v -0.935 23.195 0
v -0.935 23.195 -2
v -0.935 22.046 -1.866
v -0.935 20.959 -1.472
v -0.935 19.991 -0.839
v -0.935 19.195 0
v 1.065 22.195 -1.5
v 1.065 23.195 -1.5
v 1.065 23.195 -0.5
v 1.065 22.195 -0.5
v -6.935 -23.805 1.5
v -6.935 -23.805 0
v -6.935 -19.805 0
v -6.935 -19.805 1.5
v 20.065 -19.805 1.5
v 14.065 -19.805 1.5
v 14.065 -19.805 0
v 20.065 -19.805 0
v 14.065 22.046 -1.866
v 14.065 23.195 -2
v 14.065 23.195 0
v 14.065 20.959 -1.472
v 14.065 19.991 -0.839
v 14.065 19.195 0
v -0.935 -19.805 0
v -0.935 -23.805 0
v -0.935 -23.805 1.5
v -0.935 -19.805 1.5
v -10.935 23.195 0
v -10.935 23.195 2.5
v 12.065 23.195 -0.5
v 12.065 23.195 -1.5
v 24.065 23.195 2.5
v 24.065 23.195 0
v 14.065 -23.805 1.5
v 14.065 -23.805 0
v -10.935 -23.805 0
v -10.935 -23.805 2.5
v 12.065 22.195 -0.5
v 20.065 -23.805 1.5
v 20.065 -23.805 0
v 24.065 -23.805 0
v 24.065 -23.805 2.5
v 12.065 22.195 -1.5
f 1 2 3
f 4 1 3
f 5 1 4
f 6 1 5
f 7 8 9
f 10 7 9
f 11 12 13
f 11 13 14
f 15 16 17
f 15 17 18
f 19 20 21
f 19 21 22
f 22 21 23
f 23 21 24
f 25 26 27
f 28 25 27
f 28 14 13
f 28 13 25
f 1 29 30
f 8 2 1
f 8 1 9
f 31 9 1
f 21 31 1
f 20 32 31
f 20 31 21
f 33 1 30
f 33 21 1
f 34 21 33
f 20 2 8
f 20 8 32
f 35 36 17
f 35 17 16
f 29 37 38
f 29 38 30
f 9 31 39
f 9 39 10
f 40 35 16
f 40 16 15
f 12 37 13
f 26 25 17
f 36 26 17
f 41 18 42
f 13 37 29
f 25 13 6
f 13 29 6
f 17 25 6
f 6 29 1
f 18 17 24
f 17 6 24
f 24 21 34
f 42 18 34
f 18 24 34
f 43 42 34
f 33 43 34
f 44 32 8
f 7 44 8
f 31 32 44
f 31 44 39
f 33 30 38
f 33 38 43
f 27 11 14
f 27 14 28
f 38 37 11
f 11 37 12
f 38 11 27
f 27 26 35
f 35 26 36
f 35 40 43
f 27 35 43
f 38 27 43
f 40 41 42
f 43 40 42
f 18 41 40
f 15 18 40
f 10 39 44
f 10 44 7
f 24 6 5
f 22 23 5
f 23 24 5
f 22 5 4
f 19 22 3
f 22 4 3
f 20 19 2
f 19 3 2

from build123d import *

# Parameters (mm, degrees)
F0_W        = 35
F0_H        = 47
F1_DEPTH    = 2.5
F2_W        = 6
F2_H        = 1.5
F3_DEPTH    = 4
F4_W        = 15
F4_H        = 4
F5_DEPTH    = 2
F6_T1_DEPTH = 35
F7_W        = 11
F7_H        = 1
F8_DEPTH    = 1


# Not quite as in the source:
# - a fillet or chamfer that OpenCascade refuses, or shapes differently, is made with other operations: its cross-section is extruded or revolved along the edge and cut away or added


with BuildPart() as f1:
    # F0 (on Top) → F1 (new body)
    with BuildSketch(Plane.XY):
        with Locations((6.565169383, -0.3048535436)):
            Rectangle(F0_W, F0_H)
    extrude(amount=F1_DEPTH)

    # F2 (on face) → F3 (cut)
    with BuildSketch(Plane.XZ.offset(23.8048535436)):
        with Locations((-3.934830617, 0.75)):
            Rectangle(F2_W, F2_H)
        with Locations((17.065169383, 0.75)):
            Rectangle(F2_W, F2_H)
    extrude(amount=-F3_DEPTH, mode=Mode.SUBTRACT)

    # F4 (on face) → F5 (join)
    with BuildSketch(Plane(origin=(0, 0, 0), x_dir=(1, 0, 0), z_dir=(0, 0, -1))):
        with Locations((6.565169383, -21.1951464564)):
            Rectangle(F4_W, F4_H)
    extrude(amount=F5_DEPTH)

    # F6: fillet of radius 5 on 1 edges, made by hand

    # F6_s2 → F6_t1 (cut)
    with BuildSketch(Plane.YZ.offset(-10.934830617)):
        with BuildLine():
            ThreePointArc((19.1951464564, 0), (20.9590784789, -1.472135955), (23.1951464564, -2))
            Line((23.1951464564, -2), (19.1951464564, -2))
            Line((19.1951464564, -2), (19.1951464564, 0))
        make_face()
    extrude(amount=F6_T1_DEPTH, mode=Mode.SUBTRACT)

    # F7 (on face) → F8 (cut)
    with BuildSketch(Plane(origin=(0, 23.1951464564, 0), x_dir=(-1, 0, 0), z_dir=(0, 1, 0))):
        with Locations((-6.565169383, -1)):
            Rectangle(F7_W, F7_H)
    extrude(amount=-F8_DEPTH, mode=Mode.SUBTRACT)


solid = f1.part
